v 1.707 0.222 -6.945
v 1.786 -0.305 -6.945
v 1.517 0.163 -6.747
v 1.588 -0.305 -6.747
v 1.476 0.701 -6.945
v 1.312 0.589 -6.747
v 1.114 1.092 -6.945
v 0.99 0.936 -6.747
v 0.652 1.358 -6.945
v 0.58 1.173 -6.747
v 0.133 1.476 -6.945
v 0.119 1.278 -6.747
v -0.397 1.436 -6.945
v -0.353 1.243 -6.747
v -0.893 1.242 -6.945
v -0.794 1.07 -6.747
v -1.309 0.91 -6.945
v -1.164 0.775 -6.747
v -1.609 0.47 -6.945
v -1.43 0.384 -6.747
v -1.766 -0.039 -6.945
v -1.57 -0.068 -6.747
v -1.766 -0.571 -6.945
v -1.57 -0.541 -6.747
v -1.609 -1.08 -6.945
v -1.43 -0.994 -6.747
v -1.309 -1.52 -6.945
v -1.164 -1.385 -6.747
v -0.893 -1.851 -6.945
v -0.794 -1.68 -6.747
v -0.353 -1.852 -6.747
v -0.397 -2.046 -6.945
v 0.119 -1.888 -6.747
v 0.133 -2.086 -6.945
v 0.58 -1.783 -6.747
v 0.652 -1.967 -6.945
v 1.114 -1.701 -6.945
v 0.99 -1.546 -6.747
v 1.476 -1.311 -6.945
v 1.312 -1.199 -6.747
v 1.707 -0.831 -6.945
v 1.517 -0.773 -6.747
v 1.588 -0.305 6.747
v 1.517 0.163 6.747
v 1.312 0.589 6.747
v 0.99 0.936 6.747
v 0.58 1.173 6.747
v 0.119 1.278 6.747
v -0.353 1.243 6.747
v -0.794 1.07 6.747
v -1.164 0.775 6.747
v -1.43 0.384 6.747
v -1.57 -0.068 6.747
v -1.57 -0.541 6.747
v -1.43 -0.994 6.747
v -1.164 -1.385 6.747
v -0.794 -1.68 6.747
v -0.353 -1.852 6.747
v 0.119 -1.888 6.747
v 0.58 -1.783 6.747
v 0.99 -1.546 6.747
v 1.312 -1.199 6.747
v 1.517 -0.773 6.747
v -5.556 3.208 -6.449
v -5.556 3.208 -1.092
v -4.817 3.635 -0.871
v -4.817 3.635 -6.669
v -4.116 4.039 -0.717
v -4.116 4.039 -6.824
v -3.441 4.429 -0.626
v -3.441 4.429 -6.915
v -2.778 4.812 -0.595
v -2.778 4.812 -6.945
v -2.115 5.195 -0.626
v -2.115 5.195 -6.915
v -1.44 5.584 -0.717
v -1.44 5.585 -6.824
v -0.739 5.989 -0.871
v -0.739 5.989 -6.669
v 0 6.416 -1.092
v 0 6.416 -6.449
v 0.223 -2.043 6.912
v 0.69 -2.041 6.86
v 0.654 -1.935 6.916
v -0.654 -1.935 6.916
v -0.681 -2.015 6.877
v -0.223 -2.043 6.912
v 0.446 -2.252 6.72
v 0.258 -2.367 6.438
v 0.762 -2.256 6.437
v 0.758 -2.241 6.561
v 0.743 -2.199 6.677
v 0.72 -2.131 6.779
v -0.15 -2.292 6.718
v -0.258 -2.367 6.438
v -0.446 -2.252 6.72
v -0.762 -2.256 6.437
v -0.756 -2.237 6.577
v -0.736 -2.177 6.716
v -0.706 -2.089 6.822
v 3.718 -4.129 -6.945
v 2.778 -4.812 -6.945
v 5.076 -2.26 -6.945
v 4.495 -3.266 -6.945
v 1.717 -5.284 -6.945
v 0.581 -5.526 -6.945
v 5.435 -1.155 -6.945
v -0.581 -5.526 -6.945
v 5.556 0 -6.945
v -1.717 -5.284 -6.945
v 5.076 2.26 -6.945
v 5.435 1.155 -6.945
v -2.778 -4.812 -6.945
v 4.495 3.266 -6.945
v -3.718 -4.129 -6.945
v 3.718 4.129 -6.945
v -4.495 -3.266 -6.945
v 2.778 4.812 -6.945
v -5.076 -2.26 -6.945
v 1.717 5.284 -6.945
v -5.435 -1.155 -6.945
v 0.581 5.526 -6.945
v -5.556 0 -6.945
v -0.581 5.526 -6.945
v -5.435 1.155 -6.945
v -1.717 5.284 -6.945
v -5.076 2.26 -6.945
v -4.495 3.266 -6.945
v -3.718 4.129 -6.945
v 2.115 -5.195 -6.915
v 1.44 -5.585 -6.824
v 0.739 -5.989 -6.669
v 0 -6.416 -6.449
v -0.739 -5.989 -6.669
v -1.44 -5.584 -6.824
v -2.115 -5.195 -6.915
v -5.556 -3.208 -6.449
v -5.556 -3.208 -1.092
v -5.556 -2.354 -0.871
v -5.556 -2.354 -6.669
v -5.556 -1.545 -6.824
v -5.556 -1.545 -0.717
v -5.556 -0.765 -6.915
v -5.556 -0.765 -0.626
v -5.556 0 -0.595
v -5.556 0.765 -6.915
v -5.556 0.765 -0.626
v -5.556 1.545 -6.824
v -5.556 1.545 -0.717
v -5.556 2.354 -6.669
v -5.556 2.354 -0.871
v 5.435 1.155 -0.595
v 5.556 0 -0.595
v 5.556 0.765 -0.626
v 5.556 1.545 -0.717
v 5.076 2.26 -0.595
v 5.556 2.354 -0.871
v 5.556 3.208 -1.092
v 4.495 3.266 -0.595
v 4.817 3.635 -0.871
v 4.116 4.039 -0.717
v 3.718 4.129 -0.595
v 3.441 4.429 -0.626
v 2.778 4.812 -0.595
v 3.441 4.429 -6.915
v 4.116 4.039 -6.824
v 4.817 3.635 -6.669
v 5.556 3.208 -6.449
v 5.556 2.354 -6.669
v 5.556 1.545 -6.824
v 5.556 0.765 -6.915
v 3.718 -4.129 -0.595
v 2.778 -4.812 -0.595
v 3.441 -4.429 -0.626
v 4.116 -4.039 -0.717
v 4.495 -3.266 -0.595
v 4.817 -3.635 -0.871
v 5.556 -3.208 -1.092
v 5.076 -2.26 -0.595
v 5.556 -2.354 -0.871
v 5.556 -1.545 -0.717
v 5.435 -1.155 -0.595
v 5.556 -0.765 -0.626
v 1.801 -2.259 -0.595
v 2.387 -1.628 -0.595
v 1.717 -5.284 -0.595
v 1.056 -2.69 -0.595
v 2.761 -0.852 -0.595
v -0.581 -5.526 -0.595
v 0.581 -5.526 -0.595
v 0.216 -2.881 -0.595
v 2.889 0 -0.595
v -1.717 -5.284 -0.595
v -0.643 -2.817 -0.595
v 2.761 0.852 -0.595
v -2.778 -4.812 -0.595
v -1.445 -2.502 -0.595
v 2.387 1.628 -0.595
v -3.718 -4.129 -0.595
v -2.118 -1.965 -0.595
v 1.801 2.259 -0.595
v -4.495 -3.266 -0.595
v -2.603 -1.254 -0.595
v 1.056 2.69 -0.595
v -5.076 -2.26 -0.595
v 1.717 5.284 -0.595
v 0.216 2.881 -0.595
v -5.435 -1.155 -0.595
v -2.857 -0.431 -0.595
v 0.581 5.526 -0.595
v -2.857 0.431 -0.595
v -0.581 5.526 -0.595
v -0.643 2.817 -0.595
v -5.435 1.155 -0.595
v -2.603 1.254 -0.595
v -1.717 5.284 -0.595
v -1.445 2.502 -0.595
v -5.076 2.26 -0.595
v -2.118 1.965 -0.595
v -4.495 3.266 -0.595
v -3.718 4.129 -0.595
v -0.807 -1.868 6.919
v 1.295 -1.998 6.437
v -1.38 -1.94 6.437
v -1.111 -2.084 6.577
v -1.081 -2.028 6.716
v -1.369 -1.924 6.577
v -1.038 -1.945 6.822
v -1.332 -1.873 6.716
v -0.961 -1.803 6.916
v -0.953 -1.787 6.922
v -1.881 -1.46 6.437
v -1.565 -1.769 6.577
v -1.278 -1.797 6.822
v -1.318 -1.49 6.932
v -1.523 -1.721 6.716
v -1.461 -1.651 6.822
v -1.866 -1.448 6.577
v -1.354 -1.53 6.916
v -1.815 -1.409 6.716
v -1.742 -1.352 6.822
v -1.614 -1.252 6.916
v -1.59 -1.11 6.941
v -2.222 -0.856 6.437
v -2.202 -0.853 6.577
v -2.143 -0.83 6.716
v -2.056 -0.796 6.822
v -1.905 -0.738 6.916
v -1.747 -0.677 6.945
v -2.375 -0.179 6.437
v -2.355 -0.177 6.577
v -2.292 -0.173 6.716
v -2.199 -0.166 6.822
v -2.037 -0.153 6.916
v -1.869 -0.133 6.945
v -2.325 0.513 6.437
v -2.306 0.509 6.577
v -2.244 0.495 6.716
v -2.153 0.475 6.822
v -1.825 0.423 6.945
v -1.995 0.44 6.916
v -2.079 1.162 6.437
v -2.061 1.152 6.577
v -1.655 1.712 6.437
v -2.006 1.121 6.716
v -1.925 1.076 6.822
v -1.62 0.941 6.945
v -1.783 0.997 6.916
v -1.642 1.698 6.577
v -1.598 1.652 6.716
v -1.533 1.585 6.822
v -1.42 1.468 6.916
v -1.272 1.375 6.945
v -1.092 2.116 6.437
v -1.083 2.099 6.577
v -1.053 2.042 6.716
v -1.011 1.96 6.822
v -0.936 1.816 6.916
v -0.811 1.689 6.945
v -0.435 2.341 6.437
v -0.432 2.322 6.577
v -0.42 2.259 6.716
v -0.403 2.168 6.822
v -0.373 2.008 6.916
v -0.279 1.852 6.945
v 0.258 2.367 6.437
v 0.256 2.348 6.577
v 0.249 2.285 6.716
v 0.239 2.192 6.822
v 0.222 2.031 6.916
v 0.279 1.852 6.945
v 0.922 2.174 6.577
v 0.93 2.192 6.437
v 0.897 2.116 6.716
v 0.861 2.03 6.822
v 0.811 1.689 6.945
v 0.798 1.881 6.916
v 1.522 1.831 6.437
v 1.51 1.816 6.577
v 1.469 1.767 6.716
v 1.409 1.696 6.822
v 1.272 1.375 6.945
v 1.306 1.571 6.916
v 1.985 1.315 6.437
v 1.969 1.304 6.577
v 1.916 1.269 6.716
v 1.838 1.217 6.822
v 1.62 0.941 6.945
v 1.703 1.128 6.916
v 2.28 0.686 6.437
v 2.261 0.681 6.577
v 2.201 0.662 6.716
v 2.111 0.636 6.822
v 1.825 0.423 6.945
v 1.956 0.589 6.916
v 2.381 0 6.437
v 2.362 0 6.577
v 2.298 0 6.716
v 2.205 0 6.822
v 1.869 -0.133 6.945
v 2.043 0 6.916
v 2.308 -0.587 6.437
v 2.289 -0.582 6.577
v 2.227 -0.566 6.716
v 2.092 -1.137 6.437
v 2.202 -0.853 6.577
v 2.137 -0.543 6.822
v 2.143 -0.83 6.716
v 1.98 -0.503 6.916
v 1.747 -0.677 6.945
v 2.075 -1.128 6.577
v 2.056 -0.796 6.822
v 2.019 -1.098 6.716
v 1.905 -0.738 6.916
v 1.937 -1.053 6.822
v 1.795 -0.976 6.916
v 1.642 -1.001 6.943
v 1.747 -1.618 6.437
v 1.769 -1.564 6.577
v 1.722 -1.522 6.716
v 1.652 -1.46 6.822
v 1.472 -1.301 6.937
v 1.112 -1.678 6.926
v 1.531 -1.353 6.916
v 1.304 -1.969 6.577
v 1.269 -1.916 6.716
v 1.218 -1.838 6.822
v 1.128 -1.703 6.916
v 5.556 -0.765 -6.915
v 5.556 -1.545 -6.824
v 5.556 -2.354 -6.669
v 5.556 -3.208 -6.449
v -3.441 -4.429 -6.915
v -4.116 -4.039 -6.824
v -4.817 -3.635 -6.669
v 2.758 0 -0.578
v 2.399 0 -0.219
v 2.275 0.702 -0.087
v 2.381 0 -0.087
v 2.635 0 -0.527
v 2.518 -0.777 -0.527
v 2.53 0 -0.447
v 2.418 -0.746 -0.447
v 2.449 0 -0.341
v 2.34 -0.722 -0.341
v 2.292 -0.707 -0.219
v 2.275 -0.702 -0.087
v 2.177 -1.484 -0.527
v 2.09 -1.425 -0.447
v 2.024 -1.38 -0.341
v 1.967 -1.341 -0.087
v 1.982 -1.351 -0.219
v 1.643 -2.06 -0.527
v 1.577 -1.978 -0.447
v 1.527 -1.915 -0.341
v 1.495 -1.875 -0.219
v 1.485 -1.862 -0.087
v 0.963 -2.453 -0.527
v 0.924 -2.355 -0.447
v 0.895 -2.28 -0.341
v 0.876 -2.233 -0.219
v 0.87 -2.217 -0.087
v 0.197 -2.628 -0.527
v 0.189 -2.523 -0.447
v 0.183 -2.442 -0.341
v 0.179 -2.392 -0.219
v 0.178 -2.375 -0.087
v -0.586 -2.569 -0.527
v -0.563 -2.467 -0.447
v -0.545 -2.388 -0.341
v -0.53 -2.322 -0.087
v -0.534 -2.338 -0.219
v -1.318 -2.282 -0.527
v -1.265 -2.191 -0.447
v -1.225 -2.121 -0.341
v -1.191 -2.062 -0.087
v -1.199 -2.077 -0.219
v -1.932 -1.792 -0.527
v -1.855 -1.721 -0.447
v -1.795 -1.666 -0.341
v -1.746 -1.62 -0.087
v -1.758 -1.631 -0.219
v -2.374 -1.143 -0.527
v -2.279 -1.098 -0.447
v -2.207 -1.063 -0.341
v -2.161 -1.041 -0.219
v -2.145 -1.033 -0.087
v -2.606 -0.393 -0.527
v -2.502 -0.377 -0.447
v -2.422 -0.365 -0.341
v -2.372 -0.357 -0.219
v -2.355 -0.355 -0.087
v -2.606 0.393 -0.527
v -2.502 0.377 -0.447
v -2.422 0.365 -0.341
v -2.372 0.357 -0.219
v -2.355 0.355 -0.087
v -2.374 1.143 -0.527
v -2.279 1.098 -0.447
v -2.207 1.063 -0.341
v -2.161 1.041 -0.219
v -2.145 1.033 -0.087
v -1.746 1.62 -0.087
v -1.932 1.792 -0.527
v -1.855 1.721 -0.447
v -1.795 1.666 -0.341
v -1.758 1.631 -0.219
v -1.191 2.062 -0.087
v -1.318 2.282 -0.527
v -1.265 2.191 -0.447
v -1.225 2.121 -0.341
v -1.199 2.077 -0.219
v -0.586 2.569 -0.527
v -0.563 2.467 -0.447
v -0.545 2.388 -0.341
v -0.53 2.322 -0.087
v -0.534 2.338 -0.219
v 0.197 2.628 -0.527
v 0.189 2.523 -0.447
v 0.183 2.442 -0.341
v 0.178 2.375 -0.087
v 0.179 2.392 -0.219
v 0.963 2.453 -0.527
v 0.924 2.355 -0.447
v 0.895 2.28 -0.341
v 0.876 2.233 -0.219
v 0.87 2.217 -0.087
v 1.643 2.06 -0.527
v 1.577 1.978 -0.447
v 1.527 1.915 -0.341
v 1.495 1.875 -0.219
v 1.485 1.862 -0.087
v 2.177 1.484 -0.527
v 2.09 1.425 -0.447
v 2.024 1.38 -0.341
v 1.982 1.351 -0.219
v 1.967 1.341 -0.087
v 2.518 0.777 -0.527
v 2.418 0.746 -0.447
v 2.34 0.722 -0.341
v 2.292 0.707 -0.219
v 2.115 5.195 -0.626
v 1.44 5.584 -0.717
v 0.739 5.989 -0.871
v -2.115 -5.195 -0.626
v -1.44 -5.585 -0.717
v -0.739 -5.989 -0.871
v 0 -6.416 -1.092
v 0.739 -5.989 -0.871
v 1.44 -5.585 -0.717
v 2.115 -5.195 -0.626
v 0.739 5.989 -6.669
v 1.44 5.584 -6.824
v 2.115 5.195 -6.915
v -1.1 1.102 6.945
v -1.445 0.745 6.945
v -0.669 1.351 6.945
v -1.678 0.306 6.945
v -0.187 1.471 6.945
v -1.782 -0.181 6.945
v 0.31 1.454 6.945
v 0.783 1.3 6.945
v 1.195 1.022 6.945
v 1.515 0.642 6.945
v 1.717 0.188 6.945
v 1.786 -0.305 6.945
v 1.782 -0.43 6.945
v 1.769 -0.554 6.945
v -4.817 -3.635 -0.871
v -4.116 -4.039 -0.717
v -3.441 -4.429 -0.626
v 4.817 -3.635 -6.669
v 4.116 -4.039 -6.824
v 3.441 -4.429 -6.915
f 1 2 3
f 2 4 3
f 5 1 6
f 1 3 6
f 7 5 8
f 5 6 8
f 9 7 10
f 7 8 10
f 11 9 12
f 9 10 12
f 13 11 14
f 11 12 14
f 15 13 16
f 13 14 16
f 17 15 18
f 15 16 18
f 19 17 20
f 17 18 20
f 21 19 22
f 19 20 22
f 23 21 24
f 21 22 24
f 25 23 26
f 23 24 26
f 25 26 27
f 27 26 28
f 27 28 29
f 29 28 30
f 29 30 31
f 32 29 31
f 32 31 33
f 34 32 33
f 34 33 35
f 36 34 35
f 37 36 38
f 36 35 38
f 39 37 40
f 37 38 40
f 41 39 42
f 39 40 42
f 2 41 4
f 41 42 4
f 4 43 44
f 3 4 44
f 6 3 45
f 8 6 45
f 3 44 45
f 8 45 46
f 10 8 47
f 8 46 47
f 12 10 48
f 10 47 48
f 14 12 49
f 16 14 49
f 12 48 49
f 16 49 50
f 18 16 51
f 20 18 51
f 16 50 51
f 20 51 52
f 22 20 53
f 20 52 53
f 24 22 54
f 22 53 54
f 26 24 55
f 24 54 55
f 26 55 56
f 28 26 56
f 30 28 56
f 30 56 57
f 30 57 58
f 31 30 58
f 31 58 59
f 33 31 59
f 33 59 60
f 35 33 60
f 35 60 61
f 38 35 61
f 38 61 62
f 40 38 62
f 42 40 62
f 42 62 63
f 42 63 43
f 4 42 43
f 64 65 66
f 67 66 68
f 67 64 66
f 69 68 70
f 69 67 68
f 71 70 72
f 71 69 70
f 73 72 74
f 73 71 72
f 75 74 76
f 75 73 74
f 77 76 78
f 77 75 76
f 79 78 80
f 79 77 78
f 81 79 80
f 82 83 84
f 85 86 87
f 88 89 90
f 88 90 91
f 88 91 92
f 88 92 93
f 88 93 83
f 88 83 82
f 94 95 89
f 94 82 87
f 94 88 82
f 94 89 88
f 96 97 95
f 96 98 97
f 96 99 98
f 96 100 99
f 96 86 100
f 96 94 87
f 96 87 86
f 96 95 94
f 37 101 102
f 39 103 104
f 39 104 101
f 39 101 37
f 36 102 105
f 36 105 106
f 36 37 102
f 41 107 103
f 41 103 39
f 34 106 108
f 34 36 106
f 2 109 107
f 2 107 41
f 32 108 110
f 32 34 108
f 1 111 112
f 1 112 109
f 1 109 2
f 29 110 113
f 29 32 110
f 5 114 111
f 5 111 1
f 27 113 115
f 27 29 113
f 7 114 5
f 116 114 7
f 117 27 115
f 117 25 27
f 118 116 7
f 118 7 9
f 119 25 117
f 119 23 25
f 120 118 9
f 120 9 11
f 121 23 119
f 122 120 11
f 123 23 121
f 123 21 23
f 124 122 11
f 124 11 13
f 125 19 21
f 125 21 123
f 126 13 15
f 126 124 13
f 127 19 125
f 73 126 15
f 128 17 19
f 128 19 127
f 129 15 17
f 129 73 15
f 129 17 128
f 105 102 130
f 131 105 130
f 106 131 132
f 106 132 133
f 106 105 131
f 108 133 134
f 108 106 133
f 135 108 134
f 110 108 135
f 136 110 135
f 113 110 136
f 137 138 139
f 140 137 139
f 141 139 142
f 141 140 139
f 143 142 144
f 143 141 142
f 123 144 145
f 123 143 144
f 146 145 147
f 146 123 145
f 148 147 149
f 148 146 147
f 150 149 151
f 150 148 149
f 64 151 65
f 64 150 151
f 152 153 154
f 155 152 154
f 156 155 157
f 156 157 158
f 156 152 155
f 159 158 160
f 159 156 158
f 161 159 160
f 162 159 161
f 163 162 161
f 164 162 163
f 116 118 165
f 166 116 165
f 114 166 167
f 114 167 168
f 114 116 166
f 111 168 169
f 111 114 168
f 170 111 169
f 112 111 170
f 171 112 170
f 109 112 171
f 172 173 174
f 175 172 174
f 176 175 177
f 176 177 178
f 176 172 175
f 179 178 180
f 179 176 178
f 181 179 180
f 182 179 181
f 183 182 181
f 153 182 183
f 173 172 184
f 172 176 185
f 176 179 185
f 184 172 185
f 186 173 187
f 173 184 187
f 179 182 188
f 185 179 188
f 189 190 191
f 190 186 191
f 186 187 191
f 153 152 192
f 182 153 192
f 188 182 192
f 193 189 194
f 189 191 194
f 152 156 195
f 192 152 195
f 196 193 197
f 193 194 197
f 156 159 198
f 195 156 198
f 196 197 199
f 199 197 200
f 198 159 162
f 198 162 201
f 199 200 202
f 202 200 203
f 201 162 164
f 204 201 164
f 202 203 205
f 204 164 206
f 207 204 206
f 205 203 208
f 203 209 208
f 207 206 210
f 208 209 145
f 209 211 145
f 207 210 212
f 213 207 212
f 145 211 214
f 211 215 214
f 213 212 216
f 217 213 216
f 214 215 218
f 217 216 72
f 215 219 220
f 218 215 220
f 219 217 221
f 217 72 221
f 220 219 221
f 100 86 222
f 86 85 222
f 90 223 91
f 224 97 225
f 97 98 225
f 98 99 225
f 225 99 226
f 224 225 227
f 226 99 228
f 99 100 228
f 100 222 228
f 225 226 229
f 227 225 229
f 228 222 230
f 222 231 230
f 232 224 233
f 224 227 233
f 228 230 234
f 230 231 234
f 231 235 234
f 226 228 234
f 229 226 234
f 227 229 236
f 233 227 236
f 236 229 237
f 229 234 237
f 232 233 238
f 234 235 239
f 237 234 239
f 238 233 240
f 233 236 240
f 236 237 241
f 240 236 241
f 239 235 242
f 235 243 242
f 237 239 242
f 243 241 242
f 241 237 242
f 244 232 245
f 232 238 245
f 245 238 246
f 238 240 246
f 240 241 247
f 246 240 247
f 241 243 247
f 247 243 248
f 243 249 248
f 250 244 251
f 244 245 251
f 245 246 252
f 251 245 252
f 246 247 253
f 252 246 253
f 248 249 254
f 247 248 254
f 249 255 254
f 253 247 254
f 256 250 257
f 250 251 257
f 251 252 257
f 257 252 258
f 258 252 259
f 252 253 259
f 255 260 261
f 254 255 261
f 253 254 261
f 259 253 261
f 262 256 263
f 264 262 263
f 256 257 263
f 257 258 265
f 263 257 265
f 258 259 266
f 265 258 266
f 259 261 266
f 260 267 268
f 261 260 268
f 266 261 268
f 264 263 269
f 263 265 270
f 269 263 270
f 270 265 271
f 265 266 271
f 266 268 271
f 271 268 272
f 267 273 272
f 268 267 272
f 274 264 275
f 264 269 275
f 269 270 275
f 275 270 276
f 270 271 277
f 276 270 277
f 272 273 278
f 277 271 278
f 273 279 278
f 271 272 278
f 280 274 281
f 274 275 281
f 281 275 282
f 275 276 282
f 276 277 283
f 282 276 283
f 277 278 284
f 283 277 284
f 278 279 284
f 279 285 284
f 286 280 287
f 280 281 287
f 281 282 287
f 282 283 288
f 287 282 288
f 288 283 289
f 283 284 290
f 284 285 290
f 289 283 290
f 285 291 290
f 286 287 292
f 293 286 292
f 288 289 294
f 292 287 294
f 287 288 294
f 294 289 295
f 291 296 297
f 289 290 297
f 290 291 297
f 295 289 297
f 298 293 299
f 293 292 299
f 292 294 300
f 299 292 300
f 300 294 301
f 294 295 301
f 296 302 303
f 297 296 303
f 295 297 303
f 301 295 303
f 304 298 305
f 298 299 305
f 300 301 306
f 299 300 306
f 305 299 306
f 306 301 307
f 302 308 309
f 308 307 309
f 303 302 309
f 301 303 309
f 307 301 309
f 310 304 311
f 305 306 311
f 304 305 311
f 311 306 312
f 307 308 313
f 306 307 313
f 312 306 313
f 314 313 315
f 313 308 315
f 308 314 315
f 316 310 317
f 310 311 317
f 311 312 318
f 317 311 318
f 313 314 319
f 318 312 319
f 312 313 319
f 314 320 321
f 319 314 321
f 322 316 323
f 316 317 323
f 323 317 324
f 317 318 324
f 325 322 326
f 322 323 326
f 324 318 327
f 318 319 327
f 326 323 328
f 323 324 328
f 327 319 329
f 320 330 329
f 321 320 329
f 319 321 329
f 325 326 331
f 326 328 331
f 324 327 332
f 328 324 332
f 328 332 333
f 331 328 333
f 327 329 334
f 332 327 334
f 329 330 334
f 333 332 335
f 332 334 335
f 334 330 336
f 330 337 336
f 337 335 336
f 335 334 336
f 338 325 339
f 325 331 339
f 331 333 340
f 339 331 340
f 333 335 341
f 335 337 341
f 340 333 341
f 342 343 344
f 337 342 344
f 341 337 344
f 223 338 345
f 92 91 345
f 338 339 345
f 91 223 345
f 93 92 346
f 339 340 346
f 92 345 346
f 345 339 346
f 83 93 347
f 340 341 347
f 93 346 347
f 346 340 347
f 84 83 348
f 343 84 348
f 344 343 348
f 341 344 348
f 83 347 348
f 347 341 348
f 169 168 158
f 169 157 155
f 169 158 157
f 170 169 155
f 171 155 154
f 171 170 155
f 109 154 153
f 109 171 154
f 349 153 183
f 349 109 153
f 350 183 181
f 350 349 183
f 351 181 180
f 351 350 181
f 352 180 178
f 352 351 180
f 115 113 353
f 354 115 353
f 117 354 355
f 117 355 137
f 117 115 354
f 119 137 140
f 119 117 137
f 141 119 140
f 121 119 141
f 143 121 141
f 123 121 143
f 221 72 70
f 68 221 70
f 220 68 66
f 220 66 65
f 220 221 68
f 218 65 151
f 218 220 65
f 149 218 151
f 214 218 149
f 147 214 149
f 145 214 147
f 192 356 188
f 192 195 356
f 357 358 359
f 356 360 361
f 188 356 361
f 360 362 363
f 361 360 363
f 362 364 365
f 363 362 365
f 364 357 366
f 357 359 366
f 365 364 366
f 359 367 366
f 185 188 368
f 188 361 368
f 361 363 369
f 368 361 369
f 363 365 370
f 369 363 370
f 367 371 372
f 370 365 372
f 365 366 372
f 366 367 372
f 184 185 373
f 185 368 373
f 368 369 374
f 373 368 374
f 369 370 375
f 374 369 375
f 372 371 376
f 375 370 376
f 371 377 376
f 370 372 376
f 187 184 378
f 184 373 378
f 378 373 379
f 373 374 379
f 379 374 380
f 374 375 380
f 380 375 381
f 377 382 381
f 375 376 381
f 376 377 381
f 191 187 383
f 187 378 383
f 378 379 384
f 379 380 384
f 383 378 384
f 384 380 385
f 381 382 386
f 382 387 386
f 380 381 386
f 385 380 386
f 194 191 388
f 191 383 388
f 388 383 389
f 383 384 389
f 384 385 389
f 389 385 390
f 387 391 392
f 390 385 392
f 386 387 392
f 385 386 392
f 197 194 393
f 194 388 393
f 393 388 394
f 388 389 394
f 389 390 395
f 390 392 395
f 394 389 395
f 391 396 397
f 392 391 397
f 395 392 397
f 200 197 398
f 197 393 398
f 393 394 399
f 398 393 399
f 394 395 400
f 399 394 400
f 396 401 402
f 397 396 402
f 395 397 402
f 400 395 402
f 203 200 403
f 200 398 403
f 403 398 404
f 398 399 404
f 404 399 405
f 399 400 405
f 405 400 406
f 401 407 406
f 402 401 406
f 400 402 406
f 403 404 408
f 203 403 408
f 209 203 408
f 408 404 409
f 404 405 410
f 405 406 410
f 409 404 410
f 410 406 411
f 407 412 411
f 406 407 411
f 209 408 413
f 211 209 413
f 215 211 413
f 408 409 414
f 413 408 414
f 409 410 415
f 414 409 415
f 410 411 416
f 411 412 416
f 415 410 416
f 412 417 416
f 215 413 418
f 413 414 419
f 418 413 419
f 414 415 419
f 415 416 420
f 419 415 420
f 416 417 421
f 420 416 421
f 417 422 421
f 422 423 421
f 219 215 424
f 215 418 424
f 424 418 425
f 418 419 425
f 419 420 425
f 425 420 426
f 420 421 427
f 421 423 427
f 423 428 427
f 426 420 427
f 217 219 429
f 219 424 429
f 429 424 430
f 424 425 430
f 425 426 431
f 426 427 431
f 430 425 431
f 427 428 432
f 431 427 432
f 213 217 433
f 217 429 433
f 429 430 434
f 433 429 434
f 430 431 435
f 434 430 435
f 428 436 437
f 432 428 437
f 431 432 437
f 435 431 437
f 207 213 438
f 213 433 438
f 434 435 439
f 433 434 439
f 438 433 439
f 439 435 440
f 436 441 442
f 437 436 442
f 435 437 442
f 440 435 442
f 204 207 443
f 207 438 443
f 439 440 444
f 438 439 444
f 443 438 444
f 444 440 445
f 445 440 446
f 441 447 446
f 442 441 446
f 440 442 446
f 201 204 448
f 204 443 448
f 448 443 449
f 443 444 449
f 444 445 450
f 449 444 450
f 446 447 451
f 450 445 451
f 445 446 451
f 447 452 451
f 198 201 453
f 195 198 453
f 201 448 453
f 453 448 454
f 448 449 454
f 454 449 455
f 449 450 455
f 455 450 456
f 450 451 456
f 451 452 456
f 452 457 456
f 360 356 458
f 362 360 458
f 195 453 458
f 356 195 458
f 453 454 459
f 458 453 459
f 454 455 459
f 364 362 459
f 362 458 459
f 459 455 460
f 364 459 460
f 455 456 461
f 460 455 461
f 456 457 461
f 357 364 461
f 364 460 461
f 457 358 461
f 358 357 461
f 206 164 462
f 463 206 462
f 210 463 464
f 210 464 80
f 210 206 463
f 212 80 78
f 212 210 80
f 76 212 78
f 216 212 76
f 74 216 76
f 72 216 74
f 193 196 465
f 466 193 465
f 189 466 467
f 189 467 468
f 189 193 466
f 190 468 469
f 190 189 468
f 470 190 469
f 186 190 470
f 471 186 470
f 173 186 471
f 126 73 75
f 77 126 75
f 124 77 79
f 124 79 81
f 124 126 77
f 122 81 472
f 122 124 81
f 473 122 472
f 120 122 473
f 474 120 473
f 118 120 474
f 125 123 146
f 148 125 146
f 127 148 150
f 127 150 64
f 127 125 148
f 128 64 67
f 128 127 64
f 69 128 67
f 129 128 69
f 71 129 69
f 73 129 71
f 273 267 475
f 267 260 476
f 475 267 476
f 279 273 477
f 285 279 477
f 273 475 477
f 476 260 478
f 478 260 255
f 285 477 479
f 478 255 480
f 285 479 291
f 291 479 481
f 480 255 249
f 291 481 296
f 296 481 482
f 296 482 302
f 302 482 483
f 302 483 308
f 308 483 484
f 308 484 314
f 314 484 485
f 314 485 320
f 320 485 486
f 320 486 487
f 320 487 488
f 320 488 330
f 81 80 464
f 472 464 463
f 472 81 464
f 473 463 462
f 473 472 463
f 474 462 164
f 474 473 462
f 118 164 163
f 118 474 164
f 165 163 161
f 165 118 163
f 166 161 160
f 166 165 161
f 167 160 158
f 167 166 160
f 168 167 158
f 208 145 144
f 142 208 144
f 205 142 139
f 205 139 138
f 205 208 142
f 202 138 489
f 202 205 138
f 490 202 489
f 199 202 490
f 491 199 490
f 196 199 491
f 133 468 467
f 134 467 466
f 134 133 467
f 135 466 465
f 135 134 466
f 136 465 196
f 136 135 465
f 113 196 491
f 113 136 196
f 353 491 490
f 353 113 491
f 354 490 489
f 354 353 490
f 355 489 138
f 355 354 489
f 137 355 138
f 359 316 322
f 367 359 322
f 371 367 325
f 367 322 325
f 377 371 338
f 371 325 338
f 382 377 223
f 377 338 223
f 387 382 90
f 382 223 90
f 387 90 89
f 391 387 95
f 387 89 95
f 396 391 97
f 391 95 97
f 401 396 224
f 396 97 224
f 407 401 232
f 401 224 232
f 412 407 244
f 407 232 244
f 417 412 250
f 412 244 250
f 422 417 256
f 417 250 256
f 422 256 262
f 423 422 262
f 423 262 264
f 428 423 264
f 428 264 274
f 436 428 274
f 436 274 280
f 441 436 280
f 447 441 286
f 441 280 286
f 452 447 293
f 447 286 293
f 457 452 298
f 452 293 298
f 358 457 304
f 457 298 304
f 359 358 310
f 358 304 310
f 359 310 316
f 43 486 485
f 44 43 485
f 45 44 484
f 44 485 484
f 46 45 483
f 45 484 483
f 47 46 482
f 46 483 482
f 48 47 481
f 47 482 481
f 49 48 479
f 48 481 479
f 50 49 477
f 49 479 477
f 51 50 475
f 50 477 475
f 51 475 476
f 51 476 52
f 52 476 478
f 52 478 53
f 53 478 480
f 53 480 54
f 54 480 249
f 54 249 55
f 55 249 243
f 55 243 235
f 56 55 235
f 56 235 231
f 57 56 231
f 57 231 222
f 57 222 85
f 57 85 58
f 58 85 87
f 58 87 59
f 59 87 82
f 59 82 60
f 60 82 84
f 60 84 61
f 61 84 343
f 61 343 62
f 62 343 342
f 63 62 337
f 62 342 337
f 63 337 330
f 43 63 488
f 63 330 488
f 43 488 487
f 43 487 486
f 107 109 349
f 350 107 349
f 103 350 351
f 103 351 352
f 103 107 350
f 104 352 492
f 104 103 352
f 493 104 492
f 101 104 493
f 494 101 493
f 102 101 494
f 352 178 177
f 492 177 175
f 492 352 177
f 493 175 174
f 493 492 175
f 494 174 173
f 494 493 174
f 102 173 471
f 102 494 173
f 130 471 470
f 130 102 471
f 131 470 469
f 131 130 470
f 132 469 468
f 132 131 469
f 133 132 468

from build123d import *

# Parameters (mm, degrees)
HEX_EXTRUDE_DEPTH        = 6.35
SKETCH4_OUTSIDE_W        = 77.352
SKETCH4_OUTSIDE_H        = 79.072
SKETCH4_OUTSIDE_R        = 5.55625
HEX_CUT1_DEPTH           = 17.278326973
HEX_CUT1_DRAFT           = -60
SKETCH5_OUTSIDE_W        = 60.292
SKETCH5_OUTSIDE_H        = 62.012
SKETCH5_OUTSIDE_R        = 5.55625
HEX_CUT2_DEPTH           = 12.353215031
HEX_CUT2_DRAFT           = -60
SKETCH6_R                = 1.5875
ECCENTRIC_HOLE_CUT_DEPTH = 17.278326973
FILLET_2_R               = 0.508


with BuildPart() as part:
    # Sketch2 → Body Revolve (revolve)
    with BuildSketch(Plane(origin=(0, 0, 0), x_dir=(0, 0, -1), z_dir=(1, 0, 0)), mode=Mode.PRIVATE) as body_revolve_sk:
        Polygon((-6.9453125, 0), (6.9453125, 0), (6.9453125, 5.55625), (0.5953125, 5.55625), (0.5953125, 2.38125), (-6.9453125, 2.38125), align=None)
    revolve(body_revolve_sk.sketch.rotate(Axis((0, 0, 6.9453125), (0, 0, -1)), 90), axis=Axis((0, 0, 6.9453125), (0, 0, -1)))

    # Sketch3 → Hex Extrude (add)
    with BuildSketch(Plane(origin=(0, 0, -6.9453125), x_dir=(-1, 0, 0), z_dir=(0, 0, -1))):
        Polygon((0, 6.415804866), (-5.55625, 3.207902433), (-5.55625, -3.207902433), (0, -6.415804866), (5.55625, -3.207902433), (5.55625, 3.207902433), align=None)
    extrude(amount=-HEX_EXTRUDE_DEPTH)


with BuildPart() as hex_cut1_tool:
    # Sketch4 outside → Hex Cut1 (with draft: the straight prism first)
    with BuildSketch(Plane(origin=(0, 0, -6.9453125), x_dir=(-1, 0, 0), z_dir=(0, 0, -1))):
        Rectangle(SKETCH4_OUTSIDE_W, SKETCH4_OUTSIDE_H)
        Circle(SKETCH4_OUTSIDE_R, mode=Mode.SUBTRACT)
    extrude(amount=-HEX_CUT1_DEPTH)
    # Hex Cut1: the draft: its side faces are tilted about the plane it starts from
    hex_cut1_sides = [hex_cut1_tool.faces().sort_by_distance(p)[0] for p in [
        (0, -39.536, 1.693850986),
        (-38.676, 0, 1.693850986),
        (0, 39.536, 1.693850986),
        (38.676, 0, 1.693850986),
        (5.55625, 0, 1.693850986),
    ]]
    draft(hex_cut1_sides, Plane(origin=(0, 0, -6.9453125), x_dir=(-1, 0, 0), z_dir=(0, 0, -1)), HEX_CUT1_DRAFT)


with BuildPart() as part_1:
    add(part.part)

    # Hex Cut1: cut by hex_cut1_tool
    add(hex_cut1_tool.part, mode=Mode.SUBTRACT)


with BuildPart() as hex_cut2_tool:
    # Sketch5 outside → Hex Cut2 (with draft: the straight prism first)
    with BuildSketch(Plane.XY.offset(-0.5953125)):
        Rectangle(SKETCH5_OUTSIDE_W, SKETCH5_OUTSIDE_H)
        Circle(SKETCH5_OUTSIDE_R, mode=Mode.SUBTRACT)
    extrude(amount=-HEX_CUT2_DEPTH)
    # Hex Cut2: the draft: its side faces are tilted about the plane it starts from
    hex_cut2_sides = [hex_cut2_tool.faces().sort_by_distance(p)[0] for p in [
        (0, -31.006, -6.771920015),
        (30.146, 0, -6.771920015),
        (0, 31.006, -6.771920015),
        (-30.146, 0, -6.771920015),
        (-5.55625, 0, -6.771920015),
    ]]
    draft(hex_cut2_sides, Plane.XY.offset(-0.5953125), HEX_CUT2_DRAFT)


with BuildPart() as part_2:
    add(part_1.part)

    # Hex Cut2: cut by hex_cut2_tool
    add(hex_cut2_tool.part, mode=Mode.SUBTRACT)

    # Sketch6 → Eccentric Hole Cut (cut, through all)
    with BuildSketch(Plane.XY.offset(6.9453125)):
        with Locations((0, -0.3048)):
            Circle(SKETCH6_R)
    extrude(amount=-ECCENTRIC_HOLE_CUT_DEPTH, mode=Mode.SUBTRACT)

    # Fillet 2
    fillet_2_edges = [part_2.edges().sort_by_distance(p)[0] for p in [
        (-2.38125, 0, 6.9453125),
        (-2.38125, 0, -0.5953125),
    ]]
    fillet(fillet_2_edges, radius=FILLET_2_R)

    # Chamfer 2: read off the stored shape, not the designer's step
    # Chamfer 2 outline → Chamfer 2 (revolve, cut)
    with BuildSketch(Plane.XZ.offset(0.3048)):
        Polygon((1.5875, 6.945313993), (1.5875, 6.746875), (1.785938993, 6.945313993), align=None)
        Polygon((1.7859375, -6.9453125), (1.5875, -6.746875), (1.5875, -6.9453125), align=None)
    revolve(axis=Axis((0, -0.3048, 0), (0, 0, 1)), mode=Mode.SUBTRACT)


solid = part_2.part
